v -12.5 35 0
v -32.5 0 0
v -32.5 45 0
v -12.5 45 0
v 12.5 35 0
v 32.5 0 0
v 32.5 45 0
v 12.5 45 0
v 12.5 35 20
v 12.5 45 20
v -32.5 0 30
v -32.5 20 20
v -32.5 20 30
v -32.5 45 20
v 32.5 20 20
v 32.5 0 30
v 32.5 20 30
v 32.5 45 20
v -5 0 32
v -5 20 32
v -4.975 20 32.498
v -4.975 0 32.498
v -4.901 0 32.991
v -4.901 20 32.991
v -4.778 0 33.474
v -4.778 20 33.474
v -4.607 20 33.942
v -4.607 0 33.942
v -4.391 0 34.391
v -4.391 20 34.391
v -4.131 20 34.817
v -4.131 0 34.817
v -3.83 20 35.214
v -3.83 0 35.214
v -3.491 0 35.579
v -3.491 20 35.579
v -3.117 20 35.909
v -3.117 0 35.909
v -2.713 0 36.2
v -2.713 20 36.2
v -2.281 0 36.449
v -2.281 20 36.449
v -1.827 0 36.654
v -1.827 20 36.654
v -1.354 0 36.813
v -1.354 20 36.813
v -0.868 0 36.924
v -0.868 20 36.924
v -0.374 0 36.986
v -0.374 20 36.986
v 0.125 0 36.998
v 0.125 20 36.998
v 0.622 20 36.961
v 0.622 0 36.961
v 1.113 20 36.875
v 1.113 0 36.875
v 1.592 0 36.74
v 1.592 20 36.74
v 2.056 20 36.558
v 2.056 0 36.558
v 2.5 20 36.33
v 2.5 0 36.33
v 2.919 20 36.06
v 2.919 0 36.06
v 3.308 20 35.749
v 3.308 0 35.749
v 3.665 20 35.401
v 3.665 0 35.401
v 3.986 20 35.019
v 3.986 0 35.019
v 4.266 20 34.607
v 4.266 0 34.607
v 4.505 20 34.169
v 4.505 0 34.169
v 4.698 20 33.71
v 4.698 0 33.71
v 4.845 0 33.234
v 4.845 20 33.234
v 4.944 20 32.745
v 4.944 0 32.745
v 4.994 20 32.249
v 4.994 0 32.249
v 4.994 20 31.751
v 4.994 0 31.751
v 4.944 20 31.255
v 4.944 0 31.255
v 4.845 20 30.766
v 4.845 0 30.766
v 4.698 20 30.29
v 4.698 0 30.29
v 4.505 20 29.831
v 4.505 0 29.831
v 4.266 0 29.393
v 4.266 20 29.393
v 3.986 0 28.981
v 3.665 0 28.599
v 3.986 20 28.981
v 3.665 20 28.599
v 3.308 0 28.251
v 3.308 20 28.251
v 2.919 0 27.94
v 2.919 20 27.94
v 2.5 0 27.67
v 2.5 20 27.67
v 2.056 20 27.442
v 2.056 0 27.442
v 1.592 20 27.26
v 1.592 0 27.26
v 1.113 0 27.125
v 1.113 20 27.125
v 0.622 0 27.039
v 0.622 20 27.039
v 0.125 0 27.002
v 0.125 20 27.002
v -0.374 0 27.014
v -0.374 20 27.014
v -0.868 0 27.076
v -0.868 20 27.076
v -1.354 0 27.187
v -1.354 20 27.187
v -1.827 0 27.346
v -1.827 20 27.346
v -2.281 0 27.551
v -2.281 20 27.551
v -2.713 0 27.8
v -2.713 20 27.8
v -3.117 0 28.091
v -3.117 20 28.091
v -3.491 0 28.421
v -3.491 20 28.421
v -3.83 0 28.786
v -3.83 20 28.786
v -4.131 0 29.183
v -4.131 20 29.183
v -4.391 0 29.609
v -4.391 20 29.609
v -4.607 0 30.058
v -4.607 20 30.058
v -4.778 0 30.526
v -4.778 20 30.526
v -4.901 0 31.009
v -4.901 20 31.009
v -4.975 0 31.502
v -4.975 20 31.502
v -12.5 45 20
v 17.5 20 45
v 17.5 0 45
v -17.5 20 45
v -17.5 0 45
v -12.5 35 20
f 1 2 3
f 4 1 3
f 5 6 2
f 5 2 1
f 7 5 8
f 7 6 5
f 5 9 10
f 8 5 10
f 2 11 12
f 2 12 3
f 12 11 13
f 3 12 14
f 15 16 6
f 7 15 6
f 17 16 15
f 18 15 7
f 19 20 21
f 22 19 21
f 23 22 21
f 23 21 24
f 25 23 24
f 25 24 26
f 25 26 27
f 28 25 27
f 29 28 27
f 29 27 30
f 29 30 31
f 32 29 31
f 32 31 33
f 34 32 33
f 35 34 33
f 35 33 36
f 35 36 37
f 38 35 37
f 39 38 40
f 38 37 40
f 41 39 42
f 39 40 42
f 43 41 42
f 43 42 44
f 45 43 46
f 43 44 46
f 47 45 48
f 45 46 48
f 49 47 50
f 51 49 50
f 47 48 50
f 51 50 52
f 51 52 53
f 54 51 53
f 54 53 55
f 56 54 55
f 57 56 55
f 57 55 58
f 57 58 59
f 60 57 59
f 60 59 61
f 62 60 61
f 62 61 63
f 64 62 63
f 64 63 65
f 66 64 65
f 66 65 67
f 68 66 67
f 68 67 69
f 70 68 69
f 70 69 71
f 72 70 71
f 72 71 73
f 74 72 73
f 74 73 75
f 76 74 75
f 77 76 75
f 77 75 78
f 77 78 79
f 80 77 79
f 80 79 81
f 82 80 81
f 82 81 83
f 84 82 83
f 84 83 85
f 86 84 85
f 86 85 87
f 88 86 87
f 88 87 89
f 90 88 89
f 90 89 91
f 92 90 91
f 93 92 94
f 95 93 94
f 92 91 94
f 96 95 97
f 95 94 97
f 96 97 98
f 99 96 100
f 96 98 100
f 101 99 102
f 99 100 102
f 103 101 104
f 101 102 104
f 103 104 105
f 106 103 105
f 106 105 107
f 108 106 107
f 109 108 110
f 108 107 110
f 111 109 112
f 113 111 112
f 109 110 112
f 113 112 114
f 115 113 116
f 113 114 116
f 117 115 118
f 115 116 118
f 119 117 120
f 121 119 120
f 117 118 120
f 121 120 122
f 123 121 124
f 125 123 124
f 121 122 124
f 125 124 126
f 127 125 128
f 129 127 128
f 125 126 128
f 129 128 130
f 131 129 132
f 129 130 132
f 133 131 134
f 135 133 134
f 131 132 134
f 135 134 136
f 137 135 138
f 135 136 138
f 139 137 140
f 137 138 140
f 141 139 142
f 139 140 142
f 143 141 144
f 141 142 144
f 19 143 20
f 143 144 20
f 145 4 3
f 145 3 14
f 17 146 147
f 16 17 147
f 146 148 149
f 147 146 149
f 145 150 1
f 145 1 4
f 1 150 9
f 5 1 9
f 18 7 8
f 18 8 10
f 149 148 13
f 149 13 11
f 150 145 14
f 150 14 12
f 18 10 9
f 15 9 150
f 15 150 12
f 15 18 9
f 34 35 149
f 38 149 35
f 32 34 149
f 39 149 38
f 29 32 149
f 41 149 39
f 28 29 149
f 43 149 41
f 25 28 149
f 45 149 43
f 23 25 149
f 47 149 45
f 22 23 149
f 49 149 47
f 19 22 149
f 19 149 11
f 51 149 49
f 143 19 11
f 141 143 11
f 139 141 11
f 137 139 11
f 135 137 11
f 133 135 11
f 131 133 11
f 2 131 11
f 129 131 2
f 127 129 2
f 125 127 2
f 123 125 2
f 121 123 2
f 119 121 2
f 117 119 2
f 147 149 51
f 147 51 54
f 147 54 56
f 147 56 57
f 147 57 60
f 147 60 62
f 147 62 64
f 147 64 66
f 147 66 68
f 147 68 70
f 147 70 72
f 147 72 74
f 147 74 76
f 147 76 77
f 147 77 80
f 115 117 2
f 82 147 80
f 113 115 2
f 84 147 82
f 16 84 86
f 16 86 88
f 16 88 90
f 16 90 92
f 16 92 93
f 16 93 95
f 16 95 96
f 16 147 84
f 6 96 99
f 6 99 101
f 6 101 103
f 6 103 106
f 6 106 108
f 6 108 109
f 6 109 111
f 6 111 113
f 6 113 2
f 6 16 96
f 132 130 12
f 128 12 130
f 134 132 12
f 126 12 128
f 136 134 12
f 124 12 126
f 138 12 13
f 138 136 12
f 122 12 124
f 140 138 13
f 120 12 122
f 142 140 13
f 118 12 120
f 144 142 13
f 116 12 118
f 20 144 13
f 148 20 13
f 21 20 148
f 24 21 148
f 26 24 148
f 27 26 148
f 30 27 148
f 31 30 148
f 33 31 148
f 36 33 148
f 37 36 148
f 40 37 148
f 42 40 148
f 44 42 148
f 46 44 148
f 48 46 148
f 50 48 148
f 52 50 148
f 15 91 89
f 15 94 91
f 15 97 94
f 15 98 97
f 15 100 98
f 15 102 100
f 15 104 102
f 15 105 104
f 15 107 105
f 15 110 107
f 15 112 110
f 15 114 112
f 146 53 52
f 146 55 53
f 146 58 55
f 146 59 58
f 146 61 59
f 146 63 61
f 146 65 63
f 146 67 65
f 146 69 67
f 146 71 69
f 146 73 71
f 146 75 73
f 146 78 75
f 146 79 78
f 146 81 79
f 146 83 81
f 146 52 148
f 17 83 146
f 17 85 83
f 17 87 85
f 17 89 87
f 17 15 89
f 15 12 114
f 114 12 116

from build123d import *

# Parameters (mm, degrees)
F1_DEPTH = 32.5
F2_W     = 25
F2_H     = 10
F3_DEPTH = 20.001
F4_SIZE  = 15
F5_R     = 5
F6_DEPTH = 20.001


with BuildPart() as f1:
    # F0 (on Right) → F1 (new body, symmetric)
    with BuildSketch(Plane.YZ):
        Polygon((0, 45), (0, 0), (45, 0), (45, 20), (20, 20), (20, 45), align=None)
    extrude(amount=F1_DEPTH, both=True)

    # F2 (on face) → F3 (cut, through all)
    with BuildSketch(Plane.XY.offset(20)):
        with Locations((0, 40)):
            Rectangle(F2_W, F2_H)
    extrude(amount=-F3_DEPTH, mode=Mode.SUBTRACT)

    # F4
    f4_edges = [f1.edges().sort_by_distance(p)[0] for p in [
        (32.5, 10, 45),
        (-32.5, 10, 45),
    ]]
    chamfer(f4_edges, length=F4_SIZE)

    # F5 (on face) → F6 (cut, through all)
    with BuildSketch(Plane(origin=(0, 20, 0), x_dir=(-1, 0, 0), z_dir=(0, 1, 0))):
        with Locations((0, 32)):
            Circle(F5_R)
    extrude(amount=-F6_DEPTH, mode=Mode.SUBTRACT)


solid = f1.part
